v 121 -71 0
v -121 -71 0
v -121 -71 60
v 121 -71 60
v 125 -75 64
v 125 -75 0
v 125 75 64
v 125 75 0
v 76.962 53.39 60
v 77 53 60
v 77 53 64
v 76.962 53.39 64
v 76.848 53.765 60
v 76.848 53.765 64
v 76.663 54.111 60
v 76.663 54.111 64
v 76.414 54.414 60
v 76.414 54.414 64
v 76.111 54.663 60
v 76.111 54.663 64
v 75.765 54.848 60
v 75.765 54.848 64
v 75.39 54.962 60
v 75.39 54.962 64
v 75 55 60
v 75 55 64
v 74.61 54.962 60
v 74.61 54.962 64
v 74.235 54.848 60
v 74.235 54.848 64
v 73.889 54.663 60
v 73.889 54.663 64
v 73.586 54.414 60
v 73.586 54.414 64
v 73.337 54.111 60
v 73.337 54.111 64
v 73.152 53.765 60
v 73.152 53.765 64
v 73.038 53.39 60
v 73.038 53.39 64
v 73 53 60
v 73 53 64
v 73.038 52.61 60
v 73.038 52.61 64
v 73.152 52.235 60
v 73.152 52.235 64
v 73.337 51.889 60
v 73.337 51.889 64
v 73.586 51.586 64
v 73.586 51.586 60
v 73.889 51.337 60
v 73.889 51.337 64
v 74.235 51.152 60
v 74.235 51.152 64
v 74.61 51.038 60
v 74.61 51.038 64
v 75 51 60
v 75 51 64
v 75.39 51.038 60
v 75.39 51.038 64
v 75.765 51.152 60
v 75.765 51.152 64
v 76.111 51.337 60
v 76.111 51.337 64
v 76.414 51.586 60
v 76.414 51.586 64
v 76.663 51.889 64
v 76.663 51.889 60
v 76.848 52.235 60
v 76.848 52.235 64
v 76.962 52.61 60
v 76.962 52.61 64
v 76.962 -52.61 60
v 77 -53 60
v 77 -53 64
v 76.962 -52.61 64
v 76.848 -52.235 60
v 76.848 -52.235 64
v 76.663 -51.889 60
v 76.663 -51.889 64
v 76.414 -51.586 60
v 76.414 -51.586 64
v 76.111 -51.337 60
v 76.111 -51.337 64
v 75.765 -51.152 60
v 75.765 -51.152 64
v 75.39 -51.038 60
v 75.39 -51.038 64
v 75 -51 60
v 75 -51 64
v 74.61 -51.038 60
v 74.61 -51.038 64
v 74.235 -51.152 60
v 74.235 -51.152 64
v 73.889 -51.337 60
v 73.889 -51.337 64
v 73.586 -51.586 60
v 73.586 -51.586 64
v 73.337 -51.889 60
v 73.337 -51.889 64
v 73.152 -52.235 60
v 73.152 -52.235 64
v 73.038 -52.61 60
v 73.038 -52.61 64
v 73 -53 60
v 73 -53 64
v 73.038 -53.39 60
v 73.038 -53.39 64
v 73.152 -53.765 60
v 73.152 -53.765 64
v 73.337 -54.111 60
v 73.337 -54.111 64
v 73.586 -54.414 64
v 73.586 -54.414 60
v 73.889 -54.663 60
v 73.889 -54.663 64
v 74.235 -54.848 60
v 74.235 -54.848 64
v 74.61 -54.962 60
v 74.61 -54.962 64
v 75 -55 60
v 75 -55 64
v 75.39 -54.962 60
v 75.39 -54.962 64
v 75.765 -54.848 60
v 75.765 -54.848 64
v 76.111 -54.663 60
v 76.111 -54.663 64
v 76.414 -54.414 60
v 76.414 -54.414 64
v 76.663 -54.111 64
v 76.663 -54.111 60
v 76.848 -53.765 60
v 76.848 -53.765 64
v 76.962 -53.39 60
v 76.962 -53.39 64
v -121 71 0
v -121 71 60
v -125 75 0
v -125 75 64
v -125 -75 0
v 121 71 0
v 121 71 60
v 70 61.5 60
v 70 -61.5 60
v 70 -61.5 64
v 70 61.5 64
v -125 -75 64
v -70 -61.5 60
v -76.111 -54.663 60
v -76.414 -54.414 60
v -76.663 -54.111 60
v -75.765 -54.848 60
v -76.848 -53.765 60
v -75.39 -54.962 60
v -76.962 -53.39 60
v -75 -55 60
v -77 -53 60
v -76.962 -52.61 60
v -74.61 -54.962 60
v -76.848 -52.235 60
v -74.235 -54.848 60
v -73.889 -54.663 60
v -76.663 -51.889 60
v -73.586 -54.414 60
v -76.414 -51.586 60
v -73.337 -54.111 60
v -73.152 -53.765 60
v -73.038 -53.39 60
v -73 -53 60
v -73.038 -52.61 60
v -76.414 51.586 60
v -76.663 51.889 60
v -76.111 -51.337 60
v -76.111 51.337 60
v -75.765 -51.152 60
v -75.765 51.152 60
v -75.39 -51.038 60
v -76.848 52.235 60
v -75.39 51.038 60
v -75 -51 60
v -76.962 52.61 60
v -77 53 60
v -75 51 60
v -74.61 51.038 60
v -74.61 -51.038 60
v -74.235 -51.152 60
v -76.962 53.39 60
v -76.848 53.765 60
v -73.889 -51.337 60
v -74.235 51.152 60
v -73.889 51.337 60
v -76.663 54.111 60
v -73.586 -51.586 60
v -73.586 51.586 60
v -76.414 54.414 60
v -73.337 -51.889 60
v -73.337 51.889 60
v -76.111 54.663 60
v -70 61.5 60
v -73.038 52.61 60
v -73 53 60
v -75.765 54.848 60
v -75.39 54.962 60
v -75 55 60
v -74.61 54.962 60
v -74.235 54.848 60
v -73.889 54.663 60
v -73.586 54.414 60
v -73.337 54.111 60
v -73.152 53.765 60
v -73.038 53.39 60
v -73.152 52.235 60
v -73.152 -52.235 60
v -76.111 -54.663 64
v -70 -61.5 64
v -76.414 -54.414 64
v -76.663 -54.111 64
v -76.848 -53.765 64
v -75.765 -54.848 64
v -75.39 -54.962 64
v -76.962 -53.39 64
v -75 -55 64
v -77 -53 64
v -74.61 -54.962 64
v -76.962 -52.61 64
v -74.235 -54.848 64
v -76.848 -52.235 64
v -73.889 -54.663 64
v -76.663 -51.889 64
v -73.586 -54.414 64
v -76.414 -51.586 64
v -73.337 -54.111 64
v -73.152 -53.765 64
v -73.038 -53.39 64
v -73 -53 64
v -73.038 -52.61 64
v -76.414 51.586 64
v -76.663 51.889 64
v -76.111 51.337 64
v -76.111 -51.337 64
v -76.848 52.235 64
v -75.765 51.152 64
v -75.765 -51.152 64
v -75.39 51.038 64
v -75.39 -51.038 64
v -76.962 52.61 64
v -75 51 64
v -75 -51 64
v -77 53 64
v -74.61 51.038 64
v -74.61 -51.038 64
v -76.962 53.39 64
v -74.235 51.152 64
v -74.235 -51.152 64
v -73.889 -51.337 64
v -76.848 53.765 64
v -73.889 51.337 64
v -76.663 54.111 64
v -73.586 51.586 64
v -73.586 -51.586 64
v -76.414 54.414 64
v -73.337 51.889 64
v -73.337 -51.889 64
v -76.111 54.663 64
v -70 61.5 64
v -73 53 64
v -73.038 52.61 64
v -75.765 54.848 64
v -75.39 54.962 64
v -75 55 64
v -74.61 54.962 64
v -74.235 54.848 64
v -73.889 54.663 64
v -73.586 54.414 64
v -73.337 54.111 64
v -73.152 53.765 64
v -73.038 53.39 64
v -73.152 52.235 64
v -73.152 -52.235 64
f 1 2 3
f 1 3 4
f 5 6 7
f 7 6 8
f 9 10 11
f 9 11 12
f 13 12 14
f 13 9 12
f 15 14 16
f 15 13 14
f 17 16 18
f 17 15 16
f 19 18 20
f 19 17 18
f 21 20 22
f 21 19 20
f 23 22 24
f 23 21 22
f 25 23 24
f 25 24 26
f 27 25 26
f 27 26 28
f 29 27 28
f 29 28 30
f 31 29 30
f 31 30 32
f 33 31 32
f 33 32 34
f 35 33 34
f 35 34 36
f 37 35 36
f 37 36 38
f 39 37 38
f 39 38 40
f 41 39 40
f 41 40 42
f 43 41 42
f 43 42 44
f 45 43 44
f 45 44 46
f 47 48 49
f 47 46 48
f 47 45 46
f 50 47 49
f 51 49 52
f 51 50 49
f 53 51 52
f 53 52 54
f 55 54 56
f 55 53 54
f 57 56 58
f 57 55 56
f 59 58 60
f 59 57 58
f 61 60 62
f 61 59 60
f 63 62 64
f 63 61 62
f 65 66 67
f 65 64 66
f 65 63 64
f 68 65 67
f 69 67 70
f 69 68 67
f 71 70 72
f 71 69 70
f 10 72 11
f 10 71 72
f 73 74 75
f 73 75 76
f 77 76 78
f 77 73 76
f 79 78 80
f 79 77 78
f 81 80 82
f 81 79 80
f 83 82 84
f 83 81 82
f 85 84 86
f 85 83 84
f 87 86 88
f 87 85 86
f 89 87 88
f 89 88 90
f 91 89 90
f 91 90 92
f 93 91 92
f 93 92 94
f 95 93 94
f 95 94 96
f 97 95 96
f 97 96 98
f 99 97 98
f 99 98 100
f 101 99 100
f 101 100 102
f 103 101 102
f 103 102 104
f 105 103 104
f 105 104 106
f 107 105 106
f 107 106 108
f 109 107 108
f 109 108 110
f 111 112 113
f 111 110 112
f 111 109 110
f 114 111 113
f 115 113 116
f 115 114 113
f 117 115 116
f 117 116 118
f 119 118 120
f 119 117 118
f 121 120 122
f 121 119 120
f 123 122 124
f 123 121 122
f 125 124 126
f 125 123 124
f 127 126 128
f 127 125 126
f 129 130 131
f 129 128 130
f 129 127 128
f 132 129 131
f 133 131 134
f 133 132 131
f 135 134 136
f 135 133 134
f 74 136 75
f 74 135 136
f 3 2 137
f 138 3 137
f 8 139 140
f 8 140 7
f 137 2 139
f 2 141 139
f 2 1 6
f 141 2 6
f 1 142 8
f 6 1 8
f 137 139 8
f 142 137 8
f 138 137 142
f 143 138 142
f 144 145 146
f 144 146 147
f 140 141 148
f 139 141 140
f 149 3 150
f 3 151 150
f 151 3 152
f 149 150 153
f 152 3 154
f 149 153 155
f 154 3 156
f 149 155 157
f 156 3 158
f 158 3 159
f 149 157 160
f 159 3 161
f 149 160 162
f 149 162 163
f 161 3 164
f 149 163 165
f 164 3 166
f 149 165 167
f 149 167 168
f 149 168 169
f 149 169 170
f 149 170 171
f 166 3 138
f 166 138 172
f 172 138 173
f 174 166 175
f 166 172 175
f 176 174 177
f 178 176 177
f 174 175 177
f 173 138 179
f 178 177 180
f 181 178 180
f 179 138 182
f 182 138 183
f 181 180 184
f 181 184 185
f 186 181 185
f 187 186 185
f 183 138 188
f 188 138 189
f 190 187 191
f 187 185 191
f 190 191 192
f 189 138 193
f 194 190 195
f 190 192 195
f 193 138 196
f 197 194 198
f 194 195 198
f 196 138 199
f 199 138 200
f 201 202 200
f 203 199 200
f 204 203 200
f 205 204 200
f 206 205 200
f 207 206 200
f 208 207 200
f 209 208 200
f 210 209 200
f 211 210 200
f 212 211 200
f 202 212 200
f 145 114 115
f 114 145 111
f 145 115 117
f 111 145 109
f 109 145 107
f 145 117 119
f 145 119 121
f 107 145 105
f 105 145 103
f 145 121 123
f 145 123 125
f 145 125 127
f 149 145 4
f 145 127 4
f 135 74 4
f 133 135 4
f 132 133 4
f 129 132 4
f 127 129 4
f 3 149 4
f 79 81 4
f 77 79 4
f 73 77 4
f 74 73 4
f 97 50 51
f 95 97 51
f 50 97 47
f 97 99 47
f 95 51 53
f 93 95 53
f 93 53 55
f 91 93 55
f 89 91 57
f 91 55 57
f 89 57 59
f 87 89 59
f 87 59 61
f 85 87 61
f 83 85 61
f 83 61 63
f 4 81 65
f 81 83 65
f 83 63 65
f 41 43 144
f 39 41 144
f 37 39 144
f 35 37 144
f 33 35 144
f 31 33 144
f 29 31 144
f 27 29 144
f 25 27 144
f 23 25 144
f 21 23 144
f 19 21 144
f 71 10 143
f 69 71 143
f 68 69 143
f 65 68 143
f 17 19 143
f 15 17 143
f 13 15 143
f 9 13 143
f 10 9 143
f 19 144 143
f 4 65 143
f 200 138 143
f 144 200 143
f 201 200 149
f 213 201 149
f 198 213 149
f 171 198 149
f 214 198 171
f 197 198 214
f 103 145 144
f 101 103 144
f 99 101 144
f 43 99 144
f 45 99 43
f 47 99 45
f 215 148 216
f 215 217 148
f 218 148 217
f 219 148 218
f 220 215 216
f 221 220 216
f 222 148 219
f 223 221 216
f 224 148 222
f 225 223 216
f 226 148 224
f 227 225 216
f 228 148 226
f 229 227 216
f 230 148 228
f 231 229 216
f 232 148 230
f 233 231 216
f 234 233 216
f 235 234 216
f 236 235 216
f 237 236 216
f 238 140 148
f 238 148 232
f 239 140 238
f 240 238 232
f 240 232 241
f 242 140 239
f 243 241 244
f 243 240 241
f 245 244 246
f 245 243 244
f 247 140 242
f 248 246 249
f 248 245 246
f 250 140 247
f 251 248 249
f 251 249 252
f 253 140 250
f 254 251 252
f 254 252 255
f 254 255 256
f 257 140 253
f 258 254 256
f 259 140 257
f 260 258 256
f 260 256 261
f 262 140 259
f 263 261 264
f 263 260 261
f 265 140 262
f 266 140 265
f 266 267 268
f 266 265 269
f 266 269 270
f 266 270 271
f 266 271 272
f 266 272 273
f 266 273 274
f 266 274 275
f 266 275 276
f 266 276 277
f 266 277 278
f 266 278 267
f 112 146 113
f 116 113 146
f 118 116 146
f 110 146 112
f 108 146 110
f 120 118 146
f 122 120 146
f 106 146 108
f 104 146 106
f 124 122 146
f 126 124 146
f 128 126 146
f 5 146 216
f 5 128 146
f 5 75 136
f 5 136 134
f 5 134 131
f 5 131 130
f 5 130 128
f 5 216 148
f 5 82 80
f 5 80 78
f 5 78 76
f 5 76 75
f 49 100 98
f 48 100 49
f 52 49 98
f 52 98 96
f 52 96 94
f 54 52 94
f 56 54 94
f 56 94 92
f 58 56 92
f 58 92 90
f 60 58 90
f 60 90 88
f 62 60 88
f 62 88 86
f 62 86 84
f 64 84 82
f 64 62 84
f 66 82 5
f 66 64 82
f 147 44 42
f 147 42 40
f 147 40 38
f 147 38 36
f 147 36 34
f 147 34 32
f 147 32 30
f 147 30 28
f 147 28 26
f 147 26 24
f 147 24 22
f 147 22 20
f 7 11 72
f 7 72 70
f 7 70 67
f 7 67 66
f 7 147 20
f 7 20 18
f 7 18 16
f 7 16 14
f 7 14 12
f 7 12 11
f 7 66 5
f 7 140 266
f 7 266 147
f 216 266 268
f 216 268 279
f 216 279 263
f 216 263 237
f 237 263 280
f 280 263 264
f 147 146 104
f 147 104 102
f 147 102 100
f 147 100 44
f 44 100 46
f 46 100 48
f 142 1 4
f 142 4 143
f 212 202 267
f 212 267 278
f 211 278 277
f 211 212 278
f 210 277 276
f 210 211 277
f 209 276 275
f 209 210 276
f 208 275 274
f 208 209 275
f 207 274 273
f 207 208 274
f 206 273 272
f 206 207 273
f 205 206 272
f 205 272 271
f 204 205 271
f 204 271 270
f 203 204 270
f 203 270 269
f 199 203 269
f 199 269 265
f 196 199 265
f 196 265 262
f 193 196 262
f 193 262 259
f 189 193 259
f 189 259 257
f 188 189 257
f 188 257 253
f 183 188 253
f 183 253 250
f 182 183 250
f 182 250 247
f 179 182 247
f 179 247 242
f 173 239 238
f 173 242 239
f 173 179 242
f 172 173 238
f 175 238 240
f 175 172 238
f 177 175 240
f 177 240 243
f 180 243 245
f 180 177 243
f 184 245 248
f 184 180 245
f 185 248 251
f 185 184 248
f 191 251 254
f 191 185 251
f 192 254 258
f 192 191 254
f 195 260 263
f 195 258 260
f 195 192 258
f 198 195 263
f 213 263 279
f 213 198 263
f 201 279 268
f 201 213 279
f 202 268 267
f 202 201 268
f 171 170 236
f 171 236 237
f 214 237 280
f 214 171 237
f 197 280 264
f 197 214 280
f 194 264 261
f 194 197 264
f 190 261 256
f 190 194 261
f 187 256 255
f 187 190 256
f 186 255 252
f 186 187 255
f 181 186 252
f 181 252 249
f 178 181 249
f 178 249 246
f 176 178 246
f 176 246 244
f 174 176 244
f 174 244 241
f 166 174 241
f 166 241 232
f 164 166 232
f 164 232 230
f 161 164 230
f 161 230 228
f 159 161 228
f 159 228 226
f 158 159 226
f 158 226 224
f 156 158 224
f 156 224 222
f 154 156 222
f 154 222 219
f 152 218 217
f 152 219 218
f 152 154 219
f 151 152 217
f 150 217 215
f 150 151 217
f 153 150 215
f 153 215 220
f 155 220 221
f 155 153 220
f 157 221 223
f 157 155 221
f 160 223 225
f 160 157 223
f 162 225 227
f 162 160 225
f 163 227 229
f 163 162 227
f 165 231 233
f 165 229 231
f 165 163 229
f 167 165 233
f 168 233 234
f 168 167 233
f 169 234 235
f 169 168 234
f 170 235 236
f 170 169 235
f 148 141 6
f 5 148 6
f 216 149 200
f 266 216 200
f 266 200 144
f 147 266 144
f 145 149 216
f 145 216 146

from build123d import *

# Parameters (mm, degrees)
F0_W     = 250
F0_H     = 150
F1_DEPTH = 64
F2_T     = -4
F3_W     = 140
F3_H     = 123
F3_R     = 2
F4_DEPTH = 64.001


with BuildPart() as f1:
    # F0 (on Top) → F1 (new body)
    with BuildSketch(Plane.XY):
        Rectangle(F0_W, F0_H)
    extrude(amount=F1_DEPTH)

    # F2
    f2_openings = [f1.faces().sort_by_distance(p)[0] for p in [
        (0, 0, 0),
    ]]
    offset(amount=F2_T, openings=f2_openings)

    # F3 (on Top) → F4 (cut, through all)
    with BuildSketch(Plane.XY):
        Rectangle(F3_W, F3_H)
        with Locations((-75, -53)):
            Circle(F3_R)
        with Locations((75, -53)):
            Circle(F3_R)
        with Locations((-75, 53)):
            Circle(F3_R)
        with Locations((75, 53)):
            Circle(F3_R)
    extrude(amount=F4_DEPTH, mode=Mode.SUBTRACT)


solid = f1.part
